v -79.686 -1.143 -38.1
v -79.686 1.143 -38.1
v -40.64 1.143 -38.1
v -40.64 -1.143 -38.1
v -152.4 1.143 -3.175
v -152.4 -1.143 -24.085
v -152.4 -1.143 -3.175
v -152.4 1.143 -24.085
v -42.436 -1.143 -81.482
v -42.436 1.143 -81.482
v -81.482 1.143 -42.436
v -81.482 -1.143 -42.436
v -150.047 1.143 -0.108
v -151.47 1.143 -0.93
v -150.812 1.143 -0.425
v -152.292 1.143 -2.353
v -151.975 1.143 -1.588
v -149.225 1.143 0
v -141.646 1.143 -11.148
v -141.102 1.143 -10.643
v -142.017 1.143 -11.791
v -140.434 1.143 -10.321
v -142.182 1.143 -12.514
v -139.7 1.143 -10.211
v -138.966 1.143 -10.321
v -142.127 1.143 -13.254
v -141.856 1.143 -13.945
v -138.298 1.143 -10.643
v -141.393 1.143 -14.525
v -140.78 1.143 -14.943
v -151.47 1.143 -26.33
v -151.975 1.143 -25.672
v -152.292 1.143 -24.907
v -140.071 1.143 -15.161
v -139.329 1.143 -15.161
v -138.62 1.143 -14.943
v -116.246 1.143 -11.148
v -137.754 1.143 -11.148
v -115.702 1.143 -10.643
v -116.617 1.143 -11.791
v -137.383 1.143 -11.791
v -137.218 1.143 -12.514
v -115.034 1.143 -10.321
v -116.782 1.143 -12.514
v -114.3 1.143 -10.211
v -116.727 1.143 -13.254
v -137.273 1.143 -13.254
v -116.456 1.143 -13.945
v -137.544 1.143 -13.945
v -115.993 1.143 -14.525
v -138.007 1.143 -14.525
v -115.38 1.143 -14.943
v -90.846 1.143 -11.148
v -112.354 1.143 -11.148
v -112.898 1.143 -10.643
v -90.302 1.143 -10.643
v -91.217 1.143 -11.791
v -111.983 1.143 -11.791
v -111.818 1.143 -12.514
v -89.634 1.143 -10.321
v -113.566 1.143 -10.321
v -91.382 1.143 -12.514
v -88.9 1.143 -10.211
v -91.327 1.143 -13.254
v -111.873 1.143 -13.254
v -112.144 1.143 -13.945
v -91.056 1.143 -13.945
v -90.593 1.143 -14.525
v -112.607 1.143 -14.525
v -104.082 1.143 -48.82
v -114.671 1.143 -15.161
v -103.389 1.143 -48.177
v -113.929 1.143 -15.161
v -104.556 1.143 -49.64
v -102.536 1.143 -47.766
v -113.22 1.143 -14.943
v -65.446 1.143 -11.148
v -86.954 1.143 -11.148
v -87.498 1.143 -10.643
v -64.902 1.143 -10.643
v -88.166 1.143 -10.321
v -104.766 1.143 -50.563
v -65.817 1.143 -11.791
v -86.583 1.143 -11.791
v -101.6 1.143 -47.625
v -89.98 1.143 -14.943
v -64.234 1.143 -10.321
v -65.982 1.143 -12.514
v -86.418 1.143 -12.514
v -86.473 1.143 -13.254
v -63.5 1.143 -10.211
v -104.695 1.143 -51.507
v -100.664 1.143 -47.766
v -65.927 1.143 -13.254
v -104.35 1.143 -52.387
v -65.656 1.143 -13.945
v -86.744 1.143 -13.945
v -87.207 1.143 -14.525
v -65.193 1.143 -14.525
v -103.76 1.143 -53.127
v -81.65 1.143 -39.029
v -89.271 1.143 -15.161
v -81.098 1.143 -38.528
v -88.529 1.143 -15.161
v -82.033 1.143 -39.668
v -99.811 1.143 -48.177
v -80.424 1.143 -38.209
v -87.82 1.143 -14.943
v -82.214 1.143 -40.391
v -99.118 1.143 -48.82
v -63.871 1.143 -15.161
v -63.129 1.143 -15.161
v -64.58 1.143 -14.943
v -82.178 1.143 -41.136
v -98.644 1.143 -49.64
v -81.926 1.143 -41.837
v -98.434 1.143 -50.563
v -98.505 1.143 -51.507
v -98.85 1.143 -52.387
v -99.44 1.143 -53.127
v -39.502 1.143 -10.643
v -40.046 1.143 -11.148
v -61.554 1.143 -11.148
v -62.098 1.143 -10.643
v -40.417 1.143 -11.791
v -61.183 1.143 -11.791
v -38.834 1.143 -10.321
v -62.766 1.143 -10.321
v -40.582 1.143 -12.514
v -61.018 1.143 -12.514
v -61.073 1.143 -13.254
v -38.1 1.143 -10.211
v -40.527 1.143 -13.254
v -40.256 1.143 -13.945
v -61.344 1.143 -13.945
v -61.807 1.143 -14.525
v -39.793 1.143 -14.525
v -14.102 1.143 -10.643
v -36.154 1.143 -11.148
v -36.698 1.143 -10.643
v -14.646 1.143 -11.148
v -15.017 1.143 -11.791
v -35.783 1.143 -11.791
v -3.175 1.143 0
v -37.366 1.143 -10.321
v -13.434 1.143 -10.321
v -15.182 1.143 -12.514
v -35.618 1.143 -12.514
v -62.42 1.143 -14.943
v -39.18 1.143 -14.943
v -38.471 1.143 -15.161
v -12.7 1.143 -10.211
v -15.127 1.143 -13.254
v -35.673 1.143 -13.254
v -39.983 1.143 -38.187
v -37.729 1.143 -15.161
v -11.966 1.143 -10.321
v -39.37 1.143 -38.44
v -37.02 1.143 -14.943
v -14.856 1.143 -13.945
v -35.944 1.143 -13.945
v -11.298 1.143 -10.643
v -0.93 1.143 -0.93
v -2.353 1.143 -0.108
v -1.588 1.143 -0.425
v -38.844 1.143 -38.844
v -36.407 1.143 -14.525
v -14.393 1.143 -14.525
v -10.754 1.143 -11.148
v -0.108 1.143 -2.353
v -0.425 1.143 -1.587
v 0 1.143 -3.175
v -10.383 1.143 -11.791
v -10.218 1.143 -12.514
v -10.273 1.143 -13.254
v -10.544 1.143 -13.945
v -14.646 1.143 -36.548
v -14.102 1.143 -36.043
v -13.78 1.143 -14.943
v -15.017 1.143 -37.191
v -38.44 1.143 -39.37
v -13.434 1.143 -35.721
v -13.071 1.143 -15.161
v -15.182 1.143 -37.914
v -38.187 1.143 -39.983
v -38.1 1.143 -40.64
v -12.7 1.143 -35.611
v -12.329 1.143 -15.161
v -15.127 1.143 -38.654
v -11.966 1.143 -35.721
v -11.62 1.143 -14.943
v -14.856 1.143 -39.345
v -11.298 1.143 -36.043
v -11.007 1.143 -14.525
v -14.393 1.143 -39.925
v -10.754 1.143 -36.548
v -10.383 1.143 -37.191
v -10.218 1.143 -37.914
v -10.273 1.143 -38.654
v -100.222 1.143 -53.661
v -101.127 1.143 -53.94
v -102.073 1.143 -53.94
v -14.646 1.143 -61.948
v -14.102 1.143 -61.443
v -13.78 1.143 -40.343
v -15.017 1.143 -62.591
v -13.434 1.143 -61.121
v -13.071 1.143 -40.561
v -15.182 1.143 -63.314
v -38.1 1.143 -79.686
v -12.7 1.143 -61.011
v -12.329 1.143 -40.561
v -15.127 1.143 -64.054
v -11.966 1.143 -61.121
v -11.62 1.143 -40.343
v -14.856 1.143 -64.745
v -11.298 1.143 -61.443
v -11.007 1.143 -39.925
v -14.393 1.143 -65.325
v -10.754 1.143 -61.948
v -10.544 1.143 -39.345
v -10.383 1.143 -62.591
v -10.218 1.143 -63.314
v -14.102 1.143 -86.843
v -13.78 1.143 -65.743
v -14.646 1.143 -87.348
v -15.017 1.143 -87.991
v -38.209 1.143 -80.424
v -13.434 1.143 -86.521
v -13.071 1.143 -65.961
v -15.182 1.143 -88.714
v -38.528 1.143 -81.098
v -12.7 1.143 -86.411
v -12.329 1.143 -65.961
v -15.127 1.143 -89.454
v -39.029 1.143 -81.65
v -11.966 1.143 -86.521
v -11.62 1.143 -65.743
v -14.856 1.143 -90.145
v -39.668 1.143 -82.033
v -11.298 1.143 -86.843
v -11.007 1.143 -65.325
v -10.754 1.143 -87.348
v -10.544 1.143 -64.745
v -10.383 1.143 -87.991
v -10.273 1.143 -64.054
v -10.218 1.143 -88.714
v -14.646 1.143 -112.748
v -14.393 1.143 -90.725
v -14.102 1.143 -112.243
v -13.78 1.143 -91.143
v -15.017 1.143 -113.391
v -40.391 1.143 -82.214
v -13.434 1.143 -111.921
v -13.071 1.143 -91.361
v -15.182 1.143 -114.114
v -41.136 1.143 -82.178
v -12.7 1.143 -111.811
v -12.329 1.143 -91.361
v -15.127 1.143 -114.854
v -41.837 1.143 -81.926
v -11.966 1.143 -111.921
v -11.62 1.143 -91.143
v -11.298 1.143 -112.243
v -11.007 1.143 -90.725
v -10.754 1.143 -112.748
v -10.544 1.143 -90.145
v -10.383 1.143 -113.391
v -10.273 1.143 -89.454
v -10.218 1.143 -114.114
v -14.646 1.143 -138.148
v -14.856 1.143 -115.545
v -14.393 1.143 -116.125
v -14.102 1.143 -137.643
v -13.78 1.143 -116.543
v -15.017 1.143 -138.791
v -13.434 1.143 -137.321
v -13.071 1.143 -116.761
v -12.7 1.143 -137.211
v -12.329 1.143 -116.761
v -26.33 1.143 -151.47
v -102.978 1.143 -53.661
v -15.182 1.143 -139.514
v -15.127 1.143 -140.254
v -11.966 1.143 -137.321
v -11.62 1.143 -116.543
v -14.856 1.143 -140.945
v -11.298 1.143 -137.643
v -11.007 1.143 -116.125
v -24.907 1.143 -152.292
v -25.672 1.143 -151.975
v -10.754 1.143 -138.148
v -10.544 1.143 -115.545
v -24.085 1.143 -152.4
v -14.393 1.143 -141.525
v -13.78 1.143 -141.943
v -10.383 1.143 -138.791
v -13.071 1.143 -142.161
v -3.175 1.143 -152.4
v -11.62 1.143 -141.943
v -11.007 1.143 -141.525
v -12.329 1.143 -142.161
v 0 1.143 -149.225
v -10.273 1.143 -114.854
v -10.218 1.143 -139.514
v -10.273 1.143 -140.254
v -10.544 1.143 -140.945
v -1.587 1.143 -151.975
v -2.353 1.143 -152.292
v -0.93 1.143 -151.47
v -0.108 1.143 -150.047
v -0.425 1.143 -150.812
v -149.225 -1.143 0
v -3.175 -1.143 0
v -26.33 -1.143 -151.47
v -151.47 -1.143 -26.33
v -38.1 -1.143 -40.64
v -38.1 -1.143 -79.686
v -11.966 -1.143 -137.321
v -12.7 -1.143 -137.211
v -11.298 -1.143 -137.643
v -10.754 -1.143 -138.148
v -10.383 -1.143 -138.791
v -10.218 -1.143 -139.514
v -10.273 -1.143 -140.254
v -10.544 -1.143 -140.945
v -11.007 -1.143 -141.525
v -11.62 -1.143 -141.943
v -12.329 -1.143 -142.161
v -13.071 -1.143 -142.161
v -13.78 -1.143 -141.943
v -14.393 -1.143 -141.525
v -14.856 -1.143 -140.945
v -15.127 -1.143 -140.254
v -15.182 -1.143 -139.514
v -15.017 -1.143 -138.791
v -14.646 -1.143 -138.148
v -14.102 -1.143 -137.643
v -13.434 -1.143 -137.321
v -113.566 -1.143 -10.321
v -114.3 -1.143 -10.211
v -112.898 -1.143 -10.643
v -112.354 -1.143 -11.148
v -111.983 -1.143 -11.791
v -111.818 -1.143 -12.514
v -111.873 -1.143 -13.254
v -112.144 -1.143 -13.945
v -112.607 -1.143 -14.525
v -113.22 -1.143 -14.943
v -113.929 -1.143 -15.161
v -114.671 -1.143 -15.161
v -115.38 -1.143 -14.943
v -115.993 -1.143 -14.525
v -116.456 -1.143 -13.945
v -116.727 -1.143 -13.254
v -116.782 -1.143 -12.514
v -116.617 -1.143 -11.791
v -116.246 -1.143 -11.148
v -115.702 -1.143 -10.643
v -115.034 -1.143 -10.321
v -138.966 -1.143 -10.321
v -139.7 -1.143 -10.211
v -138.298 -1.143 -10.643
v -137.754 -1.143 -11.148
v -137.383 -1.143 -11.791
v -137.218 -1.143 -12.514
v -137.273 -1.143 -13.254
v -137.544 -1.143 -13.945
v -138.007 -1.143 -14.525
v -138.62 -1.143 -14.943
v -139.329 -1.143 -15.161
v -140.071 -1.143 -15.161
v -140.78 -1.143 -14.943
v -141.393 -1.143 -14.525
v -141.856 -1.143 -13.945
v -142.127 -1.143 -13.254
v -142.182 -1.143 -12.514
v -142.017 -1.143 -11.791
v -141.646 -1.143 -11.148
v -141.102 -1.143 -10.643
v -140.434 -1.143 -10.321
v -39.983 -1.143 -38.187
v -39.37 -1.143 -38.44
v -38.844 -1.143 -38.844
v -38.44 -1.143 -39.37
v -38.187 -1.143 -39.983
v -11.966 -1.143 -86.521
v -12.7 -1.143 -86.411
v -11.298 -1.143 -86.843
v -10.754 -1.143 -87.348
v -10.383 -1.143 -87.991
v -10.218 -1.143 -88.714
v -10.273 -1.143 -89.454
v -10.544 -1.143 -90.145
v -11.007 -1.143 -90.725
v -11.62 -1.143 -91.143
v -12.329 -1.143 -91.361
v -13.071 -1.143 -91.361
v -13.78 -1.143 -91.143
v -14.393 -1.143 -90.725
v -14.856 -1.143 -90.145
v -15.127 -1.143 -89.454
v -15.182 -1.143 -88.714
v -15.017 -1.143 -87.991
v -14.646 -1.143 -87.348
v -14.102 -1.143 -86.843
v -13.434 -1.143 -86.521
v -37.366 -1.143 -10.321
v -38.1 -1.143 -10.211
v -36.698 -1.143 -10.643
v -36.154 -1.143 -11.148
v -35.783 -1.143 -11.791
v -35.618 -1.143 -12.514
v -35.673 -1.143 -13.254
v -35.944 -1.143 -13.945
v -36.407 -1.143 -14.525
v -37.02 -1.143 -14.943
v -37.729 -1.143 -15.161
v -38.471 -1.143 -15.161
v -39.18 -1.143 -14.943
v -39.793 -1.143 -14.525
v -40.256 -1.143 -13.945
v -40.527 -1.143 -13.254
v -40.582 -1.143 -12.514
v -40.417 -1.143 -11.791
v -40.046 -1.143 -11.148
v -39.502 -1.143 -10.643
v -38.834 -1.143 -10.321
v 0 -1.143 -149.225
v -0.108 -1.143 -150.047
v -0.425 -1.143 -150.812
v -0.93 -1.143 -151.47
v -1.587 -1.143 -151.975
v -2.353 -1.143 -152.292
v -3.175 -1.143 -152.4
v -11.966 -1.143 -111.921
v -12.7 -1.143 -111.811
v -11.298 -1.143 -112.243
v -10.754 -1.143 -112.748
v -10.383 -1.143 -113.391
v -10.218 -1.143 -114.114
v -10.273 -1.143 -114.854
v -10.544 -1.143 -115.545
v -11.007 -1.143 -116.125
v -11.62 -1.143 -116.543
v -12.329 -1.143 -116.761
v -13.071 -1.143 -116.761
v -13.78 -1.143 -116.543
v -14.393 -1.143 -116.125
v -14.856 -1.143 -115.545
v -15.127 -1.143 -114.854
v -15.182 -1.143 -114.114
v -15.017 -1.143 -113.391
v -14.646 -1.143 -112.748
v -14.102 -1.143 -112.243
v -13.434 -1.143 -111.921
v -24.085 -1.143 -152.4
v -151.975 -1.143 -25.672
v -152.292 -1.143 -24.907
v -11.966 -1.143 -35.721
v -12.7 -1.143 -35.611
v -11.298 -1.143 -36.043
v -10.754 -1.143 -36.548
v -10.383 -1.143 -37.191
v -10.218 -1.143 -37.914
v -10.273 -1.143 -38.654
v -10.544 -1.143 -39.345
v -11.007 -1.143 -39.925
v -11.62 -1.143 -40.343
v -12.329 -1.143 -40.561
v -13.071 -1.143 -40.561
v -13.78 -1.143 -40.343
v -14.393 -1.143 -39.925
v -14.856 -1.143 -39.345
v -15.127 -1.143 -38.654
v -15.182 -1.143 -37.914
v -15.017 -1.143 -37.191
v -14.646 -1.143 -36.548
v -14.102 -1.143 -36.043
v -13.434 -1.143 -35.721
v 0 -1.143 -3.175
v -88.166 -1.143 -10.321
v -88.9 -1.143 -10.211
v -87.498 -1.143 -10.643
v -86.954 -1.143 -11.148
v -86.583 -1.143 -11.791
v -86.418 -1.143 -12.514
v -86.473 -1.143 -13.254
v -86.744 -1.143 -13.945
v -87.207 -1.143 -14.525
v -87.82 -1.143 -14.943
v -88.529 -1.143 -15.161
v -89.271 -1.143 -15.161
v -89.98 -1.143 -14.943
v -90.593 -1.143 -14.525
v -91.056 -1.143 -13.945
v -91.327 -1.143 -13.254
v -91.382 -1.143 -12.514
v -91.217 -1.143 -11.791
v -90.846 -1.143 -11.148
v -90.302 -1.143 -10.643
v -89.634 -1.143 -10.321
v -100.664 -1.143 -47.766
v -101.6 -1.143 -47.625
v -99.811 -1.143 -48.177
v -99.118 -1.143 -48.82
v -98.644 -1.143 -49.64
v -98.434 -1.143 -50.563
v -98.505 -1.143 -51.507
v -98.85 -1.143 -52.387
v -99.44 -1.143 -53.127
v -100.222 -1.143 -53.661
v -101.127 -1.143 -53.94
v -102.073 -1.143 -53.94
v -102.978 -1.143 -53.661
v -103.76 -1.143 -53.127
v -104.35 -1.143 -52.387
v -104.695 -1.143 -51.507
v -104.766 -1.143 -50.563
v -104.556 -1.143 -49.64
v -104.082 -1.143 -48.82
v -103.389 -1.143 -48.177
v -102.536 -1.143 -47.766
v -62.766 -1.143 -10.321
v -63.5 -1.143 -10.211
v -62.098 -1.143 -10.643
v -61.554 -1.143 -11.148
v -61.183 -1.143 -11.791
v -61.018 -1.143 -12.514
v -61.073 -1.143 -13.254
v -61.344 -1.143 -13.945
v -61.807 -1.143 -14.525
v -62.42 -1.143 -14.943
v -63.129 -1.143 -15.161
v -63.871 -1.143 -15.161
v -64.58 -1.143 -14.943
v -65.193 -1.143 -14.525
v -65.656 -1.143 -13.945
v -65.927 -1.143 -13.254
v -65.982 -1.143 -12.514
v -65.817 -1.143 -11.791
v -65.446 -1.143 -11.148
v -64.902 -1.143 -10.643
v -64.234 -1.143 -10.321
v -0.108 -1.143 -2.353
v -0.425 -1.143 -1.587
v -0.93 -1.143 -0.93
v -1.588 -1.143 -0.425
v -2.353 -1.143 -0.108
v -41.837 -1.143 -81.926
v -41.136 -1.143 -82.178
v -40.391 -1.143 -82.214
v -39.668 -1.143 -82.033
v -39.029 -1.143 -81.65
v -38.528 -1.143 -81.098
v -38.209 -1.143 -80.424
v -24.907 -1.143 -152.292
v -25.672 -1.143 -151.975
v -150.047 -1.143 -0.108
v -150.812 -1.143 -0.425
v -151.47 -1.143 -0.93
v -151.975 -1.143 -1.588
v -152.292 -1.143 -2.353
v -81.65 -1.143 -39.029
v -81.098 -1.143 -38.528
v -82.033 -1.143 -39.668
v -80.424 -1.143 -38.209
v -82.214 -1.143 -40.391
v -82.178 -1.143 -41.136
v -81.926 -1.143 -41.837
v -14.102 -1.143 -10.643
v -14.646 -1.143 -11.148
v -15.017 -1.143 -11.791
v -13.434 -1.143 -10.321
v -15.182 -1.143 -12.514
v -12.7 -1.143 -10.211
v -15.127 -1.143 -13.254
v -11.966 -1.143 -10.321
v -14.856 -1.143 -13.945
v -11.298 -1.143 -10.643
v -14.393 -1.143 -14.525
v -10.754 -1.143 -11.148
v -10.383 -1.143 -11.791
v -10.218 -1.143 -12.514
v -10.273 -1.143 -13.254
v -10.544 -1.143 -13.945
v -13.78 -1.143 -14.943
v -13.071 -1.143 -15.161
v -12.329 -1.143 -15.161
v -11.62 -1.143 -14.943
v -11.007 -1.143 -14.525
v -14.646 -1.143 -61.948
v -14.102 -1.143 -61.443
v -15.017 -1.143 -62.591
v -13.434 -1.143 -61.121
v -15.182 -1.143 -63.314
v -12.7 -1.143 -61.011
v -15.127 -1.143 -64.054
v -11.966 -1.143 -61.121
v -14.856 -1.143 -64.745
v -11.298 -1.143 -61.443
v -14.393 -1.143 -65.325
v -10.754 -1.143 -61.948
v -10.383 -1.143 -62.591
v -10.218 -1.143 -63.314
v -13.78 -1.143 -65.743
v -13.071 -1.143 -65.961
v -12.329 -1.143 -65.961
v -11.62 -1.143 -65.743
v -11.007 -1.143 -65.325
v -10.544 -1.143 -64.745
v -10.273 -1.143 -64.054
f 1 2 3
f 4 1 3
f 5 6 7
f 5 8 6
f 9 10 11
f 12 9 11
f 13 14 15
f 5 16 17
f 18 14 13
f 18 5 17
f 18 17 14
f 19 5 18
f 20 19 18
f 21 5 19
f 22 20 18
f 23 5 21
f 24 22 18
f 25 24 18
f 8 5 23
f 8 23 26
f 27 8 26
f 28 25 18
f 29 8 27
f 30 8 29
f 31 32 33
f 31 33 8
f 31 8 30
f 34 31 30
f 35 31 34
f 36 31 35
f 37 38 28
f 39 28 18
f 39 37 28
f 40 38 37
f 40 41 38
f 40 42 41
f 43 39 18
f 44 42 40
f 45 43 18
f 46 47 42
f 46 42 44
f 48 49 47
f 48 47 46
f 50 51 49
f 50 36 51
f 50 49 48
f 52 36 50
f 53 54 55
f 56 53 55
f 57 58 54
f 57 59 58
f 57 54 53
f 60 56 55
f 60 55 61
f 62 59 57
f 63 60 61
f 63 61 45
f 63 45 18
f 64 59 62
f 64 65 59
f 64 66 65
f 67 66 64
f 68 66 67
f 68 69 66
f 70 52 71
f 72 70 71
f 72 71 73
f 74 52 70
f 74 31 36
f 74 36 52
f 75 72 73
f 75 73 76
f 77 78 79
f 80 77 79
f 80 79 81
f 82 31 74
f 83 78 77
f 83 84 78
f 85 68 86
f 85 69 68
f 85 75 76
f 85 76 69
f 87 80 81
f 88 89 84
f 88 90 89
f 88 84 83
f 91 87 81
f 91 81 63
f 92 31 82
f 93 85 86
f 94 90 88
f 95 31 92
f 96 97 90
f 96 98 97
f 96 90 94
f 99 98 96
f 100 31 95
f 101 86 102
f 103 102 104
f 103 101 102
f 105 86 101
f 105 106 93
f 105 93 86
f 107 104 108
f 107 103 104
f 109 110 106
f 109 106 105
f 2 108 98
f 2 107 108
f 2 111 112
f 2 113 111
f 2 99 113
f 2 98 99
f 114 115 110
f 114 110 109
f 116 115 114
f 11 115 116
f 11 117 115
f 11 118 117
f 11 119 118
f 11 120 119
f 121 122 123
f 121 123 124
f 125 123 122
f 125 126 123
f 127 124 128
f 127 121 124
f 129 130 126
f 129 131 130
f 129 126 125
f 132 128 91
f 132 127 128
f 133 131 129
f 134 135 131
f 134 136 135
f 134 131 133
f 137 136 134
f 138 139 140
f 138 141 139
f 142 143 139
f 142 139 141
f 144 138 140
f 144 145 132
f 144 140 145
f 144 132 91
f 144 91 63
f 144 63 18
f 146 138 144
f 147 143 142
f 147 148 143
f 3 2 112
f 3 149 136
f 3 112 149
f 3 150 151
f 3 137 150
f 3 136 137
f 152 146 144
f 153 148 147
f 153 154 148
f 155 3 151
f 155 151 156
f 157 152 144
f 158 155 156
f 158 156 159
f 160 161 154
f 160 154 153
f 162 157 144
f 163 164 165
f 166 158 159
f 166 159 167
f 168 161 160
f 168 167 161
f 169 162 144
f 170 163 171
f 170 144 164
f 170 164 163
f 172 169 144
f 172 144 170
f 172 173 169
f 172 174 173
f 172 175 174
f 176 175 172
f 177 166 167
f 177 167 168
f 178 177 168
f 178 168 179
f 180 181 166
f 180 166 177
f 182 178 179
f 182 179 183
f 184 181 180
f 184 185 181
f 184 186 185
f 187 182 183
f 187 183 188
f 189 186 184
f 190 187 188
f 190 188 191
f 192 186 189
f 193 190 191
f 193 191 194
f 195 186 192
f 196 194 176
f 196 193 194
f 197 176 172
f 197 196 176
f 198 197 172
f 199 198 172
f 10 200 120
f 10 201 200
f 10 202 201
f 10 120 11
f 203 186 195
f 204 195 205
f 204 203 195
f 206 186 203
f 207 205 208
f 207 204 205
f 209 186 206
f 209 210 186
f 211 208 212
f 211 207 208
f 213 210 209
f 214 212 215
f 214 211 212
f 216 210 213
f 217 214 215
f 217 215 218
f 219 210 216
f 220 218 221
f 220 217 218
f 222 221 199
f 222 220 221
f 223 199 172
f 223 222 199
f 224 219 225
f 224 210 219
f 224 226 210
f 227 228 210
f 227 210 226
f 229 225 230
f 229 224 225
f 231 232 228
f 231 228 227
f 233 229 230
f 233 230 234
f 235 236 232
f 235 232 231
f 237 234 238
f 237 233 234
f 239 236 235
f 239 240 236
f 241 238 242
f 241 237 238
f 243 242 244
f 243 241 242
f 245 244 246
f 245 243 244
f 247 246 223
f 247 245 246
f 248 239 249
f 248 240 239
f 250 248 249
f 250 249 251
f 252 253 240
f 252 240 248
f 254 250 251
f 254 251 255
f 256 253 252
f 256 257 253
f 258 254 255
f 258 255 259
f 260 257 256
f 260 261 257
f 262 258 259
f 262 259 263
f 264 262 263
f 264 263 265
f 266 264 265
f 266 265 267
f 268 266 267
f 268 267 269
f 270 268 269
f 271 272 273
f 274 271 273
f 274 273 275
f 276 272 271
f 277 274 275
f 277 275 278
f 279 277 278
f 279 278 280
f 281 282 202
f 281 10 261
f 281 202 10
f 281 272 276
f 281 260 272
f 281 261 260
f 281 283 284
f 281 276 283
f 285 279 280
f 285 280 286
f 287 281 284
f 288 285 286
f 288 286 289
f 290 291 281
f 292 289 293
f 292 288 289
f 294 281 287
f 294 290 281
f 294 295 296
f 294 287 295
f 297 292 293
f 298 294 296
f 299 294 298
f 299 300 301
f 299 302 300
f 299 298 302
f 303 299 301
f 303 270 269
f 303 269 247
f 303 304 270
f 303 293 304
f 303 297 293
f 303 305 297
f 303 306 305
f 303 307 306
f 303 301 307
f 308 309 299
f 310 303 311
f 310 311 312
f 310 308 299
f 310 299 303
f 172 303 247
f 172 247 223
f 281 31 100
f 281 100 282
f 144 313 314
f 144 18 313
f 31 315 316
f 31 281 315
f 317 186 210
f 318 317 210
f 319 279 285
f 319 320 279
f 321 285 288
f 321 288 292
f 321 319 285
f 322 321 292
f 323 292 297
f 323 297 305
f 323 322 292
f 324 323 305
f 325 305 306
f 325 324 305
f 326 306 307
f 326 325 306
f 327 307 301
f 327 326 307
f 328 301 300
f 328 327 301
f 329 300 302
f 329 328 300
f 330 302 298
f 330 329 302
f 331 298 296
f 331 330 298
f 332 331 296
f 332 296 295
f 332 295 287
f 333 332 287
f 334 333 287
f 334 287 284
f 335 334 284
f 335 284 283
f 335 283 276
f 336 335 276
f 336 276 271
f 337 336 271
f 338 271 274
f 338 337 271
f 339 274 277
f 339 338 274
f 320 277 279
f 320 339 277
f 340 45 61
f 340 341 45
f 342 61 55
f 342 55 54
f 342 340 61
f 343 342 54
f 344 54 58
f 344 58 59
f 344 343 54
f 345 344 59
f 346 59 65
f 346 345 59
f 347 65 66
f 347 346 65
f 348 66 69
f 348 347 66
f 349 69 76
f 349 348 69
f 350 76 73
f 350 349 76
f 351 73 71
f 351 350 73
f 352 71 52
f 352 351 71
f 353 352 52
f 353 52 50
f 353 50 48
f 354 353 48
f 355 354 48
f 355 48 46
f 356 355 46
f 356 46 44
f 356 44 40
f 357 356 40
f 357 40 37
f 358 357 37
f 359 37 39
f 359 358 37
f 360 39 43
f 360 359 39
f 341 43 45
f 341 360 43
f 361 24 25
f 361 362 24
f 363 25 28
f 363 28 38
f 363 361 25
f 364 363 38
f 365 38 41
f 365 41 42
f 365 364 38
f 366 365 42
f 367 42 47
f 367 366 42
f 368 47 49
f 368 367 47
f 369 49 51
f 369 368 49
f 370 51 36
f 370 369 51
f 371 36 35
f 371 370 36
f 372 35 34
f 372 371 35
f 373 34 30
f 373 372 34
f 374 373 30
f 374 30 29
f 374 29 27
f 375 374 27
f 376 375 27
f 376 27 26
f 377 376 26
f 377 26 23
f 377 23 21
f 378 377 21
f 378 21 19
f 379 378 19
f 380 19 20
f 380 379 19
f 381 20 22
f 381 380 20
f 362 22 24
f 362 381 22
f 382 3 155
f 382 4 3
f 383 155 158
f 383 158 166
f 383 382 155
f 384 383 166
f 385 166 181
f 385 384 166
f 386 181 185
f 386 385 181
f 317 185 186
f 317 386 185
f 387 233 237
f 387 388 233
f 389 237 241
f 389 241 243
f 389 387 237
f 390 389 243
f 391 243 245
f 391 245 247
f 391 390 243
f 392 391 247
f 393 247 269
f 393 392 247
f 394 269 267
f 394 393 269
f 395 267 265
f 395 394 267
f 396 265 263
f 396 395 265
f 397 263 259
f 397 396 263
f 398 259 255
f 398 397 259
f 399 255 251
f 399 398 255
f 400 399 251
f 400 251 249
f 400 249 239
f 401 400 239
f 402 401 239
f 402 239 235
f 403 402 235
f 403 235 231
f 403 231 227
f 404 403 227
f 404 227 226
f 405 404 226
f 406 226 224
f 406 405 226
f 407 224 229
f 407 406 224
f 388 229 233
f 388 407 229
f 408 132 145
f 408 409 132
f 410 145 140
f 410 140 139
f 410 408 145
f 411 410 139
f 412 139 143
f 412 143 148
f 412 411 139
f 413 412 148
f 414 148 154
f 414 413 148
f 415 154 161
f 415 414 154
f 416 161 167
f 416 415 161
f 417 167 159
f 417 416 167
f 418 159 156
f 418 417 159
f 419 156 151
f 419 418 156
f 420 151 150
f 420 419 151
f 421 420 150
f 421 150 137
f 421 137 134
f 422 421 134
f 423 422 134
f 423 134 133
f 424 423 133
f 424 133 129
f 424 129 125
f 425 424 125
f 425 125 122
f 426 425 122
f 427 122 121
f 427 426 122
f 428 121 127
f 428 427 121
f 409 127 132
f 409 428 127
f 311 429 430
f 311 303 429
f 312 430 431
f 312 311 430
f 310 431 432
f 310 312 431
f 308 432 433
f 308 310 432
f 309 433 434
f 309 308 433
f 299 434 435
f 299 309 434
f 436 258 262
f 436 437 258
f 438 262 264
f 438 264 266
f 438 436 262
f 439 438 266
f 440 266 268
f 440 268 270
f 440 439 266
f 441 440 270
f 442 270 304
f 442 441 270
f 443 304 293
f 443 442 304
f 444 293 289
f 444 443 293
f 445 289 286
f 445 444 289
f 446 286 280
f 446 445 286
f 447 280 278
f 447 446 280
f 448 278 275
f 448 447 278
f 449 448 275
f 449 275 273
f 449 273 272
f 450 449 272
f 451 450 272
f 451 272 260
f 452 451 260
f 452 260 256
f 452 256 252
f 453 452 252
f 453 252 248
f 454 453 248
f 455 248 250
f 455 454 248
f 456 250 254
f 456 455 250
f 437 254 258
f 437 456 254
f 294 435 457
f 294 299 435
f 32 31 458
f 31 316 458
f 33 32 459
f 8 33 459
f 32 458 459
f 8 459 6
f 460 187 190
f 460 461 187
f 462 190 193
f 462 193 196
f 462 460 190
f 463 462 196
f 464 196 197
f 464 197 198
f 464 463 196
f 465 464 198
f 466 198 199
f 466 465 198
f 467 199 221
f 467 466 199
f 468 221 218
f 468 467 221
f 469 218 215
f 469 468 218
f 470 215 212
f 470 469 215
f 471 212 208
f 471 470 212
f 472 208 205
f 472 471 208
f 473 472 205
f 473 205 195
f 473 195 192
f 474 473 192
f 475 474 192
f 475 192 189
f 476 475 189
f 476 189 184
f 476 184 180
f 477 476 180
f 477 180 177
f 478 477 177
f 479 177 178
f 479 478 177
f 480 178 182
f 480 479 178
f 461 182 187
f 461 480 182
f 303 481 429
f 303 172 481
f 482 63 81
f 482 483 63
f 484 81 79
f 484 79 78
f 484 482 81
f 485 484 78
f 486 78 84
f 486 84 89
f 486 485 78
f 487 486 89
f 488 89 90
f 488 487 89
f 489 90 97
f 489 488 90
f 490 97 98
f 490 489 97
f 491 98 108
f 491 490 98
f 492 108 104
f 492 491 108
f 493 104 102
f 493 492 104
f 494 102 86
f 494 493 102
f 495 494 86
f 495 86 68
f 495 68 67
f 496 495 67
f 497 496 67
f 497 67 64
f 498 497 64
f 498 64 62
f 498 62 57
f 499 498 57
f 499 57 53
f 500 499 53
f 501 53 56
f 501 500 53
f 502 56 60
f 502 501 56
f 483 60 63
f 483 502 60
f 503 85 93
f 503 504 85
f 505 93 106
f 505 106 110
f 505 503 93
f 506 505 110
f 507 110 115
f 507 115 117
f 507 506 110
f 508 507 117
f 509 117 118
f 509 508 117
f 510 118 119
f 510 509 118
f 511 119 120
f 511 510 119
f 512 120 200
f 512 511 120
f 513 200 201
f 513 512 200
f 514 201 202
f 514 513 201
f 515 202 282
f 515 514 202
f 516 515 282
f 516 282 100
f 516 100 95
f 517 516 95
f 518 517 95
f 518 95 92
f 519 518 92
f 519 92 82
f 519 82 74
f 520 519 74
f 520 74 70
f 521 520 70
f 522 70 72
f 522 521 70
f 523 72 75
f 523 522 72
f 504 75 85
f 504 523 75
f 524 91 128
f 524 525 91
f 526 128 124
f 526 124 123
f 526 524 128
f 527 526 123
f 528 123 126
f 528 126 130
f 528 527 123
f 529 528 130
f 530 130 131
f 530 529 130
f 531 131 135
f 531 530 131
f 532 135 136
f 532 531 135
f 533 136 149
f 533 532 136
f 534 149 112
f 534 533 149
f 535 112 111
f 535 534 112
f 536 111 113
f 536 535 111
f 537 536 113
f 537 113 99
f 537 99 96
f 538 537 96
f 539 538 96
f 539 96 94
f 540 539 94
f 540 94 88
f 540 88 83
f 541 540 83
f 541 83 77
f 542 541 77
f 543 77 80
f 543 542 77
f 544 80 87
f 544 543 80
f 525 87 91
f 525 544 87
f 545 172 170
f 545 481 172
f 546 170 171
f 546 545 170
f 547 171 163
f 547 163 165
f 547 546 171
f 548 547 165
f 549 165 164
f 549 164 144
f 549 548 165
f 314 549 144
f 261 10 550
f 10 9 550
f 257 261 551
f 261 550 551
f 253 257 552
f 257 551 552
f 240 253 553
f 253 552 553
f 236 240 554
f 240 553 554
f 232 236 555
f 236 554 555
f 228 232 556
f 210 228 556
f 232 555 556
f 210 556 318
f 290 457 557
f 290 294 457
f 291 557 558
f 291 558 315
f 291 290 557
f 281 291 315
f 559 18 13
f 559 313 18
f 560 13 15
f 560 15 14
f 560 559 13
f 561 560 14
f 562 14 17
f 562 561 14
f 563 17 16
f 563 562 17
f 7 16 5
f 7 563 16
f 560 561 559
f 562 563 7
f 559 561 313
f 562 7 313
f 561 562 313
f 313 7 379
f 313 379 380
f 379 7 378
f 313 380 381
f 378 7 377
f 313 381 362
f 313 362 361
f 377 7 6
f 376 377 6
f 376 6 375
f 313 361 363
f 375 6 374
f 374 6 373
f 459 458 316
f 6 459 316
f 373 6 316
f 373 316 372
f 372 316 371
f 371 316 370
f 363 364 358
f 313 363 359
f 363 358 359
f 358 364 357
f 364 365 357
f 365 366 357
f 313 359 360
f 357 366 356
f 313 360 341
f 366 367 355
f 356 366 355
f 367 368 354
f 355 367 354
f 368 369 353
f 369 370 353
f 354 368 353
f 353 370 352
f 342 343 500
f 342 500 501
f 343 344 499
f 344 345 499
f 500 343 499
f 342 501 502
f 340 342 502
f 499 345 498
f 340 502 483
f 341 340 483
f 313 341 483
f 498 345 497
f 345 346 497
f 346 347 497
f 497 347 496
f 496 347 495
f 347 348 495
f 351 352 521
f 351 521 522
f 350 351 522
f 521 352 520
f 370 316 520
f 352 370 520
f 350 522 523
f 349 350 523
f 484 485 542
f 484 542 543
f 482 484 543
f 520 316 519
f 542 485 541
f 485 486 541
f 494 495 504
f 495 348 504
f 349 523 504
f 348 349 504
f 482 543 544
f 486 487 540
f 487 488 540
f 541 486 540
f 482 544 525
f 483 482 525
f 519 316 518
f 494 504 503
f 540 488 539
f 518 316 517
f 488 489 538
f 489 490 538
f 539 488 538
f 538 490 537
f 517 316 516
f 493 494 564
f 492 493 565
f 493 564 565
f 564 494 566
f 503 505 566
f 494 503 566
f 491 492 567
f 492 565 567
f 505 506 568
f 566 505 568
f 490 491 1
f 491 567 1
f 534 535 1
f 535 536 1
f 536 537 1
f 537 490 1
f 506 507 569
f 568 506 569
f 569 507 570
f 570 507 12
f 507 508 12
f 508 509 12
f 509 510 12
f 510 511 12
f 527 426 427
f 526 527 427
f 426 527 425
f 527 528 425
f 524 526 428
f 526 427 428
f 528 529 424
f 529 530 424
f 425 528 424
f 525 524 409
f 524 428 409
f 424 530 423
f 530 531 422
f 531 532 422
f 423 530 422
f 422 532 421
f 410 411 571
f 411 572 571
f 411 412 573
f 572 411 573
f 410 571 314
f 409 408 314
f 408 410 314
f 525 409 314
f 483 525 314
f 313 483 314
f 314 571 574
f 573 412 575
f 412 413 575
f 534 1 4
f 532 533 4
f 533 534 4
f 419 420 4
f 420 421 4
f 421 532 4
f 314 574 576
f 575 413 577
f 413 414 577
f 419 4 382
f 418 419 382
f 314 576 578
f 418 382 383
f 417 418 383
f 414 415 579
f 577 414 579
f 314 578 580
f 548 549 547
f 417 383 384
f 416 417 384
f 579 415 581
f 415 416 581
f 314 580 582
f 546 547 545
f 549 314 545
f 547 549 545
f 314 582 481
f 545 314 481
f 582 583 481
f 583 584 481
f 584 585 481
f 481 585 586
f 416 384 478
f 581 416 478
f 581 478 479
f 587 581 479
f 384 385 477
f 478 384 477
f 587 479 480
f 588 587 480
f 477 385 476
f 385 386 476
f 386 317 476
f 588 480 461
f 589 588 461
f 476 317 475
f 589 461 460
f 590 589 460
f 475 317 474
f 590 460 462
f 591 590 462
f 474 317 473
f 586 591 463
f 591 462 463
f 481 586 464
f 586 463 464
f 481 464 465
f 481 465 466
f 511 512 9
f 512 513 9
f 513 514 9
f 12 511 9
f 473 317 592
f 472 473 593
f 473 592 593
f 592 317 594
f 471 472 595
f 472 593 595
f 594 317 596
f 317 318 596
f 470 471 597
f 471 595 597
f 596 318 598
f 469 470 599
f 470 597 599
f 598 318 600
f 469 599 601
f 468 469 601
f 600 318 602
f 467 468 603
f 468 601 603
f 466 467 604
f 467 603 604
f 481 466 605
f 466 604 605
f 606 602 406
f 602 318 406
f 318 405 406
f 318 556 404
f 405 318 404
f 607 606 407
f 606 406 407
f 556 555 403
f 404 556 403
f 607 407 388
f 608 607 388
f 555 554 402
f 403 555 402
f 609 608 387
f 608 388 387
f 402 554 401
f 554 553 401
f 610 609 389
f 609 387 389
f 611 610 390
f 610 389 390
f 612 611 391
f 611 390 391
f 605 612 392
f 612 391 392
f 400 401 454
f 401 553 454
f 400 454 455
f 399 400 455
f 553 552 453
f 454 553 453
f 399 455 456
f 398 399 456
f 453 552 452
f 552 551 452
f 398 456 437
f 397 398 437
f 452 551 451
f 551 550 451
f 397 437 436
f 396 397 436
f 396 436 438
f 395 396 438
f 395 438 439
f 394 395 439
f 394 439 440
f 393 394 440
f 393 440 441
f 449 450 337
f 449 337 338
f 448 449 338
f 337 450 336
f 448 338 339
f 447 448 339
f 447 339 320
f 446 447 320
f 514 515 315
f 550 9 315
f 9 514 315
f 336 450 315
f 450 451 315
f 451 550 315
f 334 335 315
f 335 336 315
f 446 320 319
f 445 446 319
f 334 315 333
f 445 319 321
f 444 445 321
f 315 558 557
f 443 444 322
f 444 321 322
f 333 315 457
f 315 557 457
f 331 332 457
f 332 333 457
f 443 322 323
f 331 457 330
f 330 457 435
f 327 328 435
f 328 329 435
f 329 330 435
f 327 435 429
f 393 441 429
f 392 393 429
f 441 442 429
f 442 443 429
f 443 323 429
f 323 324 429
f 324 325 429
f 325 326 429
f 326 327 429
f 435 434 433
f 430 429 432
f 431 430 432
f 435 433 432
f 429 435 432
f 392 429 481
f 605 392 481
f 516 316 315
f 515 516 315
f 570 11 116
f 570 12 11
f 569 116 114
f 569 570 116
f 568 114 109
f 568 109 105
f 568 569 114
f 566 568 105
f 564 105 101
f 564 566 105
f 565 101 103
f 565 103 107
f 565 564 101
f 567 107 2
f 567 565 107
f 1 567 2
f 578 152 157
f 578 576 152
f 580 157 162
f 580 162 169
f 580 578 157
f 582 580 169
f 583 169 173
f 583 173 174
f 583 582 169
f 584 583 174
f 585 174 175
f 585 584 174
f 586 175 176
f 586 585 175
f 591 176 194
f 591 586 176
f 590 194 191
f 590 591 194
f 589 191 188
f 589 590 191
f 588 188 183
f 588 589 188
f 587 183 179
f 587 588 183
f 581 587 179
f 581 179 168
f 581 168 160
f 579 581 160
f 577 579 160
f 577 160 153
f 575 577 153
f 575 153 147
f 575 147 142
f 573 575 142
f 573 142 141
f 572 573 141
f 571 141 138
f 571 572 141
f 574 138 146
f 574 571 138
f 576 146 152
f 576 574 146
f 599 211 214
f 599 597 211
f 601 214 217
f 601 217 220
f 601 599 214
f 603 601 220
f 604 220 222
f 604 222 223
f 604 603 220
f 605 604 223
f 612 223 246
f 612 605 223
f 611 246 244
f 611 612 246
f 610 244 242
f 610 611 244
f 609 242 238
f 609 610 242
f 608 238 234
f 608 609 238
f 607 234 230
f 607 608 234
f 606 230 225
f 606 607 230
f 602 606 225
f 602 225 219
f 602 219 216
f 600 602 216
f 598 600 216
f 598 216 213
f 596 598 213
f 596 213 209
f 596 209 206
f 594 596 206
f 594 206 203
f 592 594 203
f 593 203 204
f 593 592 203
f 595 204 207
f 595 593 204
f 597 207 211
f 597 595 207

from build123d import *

# Parameters (mm, degrees)
SKETCH1_R           = 2.4892
SKETCH1_R_2         = 3.175
BOSS_EXTRUDE2_DEPTH = 1.143
FILLET1_R           = 3.175
FILLET2_R           = 3.175
SKETCH2_OUTSIDE_W   = 197.508
SKETCH2_OUTSIDE_H   = 197.508
SKETCH2_OUTSIDE_W_2 = 152.4
SKETCH2_OUTSIDE_H_2 = 152.4
CUT_EXTRUDE1_DEPTH  = 2.54
FILLET3_R           = 2.54


with BuildPart() as part:
    # Sketch1 → Boss-Extrude2 (new, symmetric)
    with BuildSketch(Plane(origin=(0, 0, 0), x_dir=(1, 0, 0), z_dir=(0, 1, 0))):
        Polygon((0, 0), (0, 152.4), (-25.4, 152.4), (-152.4, 25.4), (-152.4, 0), align=None)
        with Locations(Location((-12.7, 12.7, 0), (0, 0, 270))):
            Circle(SKETCH1_R, mode=Mode.SUBTRACT)
        with Locations(Location((-38.1, 12.7, 0), (0, 0, 270))):
            Circle(SKETCH1_R, mode=Mode.SUBTRACT)
        with Locations(Location((-63.5, 12.7, 0), (0, 0, 270))):
            Circle(SKETCH1_R, mode=Mode.SUBTRACT)
        with Locations(Location((-88.9, 12.7, 0), (0, 0, 270))):
            Circle(SKETCH1_R, mode=Mode.SUBTRACT)
        with Locations(Location((-114.3, 12.7, 0), (0, 0, 270))):
            Circle(SKETCH1_R, mode=Mode.SUBTRACT)
        with Locations(Location((-12.7, 38.1, 0), (0, 0, 270))):
            Circle(SKETCH1_R, mode=Mode.SUBTRACT)
        with Locations(Location((-12.7, 63.5, 0), (0, 0, 270))):
            Circle(SKETCH1_R, mode=Mode.SUBTRACT)
        with Locations(Location((-12.7, 88.9, 0), (0, 0, 270))):
            Circle(SKETCH1_R, mode=Mode.SUBTRACT)
        with Locations(Location((-12.7, 114.3, 0), (0, 0, 270))):
            Circle(SKETCH1_R, mode=Mode.SUBTRACT)
        with Locations(Location((-139.7, 12.7, 0), (0, 0, 270))):
            Circle(SKETCH1_R, mode=Mode.SUBTRACT)
        with Locations(Location((-12.7, 139.7, 0), (0, 0, 270))):
            Circle(SKETCH1_R, mode=Mode.SUBTRACT)
        with Locations(Location((-101.6, 50.8, 0), (0, 0, 270))):
            Circle(SKETCH1_R_2, mode=Mode.SUBTRACT)
    extrude(amount=BOSS_EXTRUDE2_DEPTH, both=True)

    # Fillet1
    fillet1_edges = [part.edges().sort_by_distance(p)[0] for p in [
        (-152.4, 0, 0),
        (0, 0, 0),
    ]]
    fillet(fillet1_edges, radius=FILLET1_R)

    # Fillet2
    fillet2_edges = [part.edges().sort_by_distance(p)[0] for p in [
        (-152.4, 0, -25.4),
        (-25.4, 0, -152.4),
        (0, 0, -152.4),
    ]]
    fillet(fillet2_edges, radius=FILLET2_R)

    # Sketch2 outside → Cut-Extrude1 (cut)
    # profile 1 of 2: a face of its own
    with BuildSketch(Plane(origin=(0, 1.143, 0), x_dir=(1, 0, 0), z_dir=(0, 1, 0))):
        with Locations((-76.2, 76.2)):
            Rectangle(SKETCH2_OUTSIDE_W, SKETCH2_OUTSIDE_H)
        with Locations((-76.2, 76.2)):
            Rectangle(SKETCH2_OUTSIDE_W_2, SKETCH2_OUTSIDE_H_2, mode=Mode.SUBTRACT)
    # profile 2 of 2: a face of its own
    with BuildSketch(Plane(origin=(0, 1.143, 0), x_dir=(1, 0, 0), z_dir=(0, 1, 0))):
        Polygon((-38.1, 85.818463274), (-85.818463274, 38.1), (-38.1, 38.1), align=None)
    extrude(amount=-CUT_EXTRUDE1_DEPTH, mode=Mode.SUBTRACT)

    # Fillet3
    fillet3_edges = [part.edges().sort_by_distance(p)[0] for p in [
        (-38.1, 0, -85.818463274),
        (-38.1, 0, -38.1),
        (-85.818463274, 0, -38.1),
    ]]
    fillet(fillet3_edges, radius=FILLET3_R)


solid = part.part
